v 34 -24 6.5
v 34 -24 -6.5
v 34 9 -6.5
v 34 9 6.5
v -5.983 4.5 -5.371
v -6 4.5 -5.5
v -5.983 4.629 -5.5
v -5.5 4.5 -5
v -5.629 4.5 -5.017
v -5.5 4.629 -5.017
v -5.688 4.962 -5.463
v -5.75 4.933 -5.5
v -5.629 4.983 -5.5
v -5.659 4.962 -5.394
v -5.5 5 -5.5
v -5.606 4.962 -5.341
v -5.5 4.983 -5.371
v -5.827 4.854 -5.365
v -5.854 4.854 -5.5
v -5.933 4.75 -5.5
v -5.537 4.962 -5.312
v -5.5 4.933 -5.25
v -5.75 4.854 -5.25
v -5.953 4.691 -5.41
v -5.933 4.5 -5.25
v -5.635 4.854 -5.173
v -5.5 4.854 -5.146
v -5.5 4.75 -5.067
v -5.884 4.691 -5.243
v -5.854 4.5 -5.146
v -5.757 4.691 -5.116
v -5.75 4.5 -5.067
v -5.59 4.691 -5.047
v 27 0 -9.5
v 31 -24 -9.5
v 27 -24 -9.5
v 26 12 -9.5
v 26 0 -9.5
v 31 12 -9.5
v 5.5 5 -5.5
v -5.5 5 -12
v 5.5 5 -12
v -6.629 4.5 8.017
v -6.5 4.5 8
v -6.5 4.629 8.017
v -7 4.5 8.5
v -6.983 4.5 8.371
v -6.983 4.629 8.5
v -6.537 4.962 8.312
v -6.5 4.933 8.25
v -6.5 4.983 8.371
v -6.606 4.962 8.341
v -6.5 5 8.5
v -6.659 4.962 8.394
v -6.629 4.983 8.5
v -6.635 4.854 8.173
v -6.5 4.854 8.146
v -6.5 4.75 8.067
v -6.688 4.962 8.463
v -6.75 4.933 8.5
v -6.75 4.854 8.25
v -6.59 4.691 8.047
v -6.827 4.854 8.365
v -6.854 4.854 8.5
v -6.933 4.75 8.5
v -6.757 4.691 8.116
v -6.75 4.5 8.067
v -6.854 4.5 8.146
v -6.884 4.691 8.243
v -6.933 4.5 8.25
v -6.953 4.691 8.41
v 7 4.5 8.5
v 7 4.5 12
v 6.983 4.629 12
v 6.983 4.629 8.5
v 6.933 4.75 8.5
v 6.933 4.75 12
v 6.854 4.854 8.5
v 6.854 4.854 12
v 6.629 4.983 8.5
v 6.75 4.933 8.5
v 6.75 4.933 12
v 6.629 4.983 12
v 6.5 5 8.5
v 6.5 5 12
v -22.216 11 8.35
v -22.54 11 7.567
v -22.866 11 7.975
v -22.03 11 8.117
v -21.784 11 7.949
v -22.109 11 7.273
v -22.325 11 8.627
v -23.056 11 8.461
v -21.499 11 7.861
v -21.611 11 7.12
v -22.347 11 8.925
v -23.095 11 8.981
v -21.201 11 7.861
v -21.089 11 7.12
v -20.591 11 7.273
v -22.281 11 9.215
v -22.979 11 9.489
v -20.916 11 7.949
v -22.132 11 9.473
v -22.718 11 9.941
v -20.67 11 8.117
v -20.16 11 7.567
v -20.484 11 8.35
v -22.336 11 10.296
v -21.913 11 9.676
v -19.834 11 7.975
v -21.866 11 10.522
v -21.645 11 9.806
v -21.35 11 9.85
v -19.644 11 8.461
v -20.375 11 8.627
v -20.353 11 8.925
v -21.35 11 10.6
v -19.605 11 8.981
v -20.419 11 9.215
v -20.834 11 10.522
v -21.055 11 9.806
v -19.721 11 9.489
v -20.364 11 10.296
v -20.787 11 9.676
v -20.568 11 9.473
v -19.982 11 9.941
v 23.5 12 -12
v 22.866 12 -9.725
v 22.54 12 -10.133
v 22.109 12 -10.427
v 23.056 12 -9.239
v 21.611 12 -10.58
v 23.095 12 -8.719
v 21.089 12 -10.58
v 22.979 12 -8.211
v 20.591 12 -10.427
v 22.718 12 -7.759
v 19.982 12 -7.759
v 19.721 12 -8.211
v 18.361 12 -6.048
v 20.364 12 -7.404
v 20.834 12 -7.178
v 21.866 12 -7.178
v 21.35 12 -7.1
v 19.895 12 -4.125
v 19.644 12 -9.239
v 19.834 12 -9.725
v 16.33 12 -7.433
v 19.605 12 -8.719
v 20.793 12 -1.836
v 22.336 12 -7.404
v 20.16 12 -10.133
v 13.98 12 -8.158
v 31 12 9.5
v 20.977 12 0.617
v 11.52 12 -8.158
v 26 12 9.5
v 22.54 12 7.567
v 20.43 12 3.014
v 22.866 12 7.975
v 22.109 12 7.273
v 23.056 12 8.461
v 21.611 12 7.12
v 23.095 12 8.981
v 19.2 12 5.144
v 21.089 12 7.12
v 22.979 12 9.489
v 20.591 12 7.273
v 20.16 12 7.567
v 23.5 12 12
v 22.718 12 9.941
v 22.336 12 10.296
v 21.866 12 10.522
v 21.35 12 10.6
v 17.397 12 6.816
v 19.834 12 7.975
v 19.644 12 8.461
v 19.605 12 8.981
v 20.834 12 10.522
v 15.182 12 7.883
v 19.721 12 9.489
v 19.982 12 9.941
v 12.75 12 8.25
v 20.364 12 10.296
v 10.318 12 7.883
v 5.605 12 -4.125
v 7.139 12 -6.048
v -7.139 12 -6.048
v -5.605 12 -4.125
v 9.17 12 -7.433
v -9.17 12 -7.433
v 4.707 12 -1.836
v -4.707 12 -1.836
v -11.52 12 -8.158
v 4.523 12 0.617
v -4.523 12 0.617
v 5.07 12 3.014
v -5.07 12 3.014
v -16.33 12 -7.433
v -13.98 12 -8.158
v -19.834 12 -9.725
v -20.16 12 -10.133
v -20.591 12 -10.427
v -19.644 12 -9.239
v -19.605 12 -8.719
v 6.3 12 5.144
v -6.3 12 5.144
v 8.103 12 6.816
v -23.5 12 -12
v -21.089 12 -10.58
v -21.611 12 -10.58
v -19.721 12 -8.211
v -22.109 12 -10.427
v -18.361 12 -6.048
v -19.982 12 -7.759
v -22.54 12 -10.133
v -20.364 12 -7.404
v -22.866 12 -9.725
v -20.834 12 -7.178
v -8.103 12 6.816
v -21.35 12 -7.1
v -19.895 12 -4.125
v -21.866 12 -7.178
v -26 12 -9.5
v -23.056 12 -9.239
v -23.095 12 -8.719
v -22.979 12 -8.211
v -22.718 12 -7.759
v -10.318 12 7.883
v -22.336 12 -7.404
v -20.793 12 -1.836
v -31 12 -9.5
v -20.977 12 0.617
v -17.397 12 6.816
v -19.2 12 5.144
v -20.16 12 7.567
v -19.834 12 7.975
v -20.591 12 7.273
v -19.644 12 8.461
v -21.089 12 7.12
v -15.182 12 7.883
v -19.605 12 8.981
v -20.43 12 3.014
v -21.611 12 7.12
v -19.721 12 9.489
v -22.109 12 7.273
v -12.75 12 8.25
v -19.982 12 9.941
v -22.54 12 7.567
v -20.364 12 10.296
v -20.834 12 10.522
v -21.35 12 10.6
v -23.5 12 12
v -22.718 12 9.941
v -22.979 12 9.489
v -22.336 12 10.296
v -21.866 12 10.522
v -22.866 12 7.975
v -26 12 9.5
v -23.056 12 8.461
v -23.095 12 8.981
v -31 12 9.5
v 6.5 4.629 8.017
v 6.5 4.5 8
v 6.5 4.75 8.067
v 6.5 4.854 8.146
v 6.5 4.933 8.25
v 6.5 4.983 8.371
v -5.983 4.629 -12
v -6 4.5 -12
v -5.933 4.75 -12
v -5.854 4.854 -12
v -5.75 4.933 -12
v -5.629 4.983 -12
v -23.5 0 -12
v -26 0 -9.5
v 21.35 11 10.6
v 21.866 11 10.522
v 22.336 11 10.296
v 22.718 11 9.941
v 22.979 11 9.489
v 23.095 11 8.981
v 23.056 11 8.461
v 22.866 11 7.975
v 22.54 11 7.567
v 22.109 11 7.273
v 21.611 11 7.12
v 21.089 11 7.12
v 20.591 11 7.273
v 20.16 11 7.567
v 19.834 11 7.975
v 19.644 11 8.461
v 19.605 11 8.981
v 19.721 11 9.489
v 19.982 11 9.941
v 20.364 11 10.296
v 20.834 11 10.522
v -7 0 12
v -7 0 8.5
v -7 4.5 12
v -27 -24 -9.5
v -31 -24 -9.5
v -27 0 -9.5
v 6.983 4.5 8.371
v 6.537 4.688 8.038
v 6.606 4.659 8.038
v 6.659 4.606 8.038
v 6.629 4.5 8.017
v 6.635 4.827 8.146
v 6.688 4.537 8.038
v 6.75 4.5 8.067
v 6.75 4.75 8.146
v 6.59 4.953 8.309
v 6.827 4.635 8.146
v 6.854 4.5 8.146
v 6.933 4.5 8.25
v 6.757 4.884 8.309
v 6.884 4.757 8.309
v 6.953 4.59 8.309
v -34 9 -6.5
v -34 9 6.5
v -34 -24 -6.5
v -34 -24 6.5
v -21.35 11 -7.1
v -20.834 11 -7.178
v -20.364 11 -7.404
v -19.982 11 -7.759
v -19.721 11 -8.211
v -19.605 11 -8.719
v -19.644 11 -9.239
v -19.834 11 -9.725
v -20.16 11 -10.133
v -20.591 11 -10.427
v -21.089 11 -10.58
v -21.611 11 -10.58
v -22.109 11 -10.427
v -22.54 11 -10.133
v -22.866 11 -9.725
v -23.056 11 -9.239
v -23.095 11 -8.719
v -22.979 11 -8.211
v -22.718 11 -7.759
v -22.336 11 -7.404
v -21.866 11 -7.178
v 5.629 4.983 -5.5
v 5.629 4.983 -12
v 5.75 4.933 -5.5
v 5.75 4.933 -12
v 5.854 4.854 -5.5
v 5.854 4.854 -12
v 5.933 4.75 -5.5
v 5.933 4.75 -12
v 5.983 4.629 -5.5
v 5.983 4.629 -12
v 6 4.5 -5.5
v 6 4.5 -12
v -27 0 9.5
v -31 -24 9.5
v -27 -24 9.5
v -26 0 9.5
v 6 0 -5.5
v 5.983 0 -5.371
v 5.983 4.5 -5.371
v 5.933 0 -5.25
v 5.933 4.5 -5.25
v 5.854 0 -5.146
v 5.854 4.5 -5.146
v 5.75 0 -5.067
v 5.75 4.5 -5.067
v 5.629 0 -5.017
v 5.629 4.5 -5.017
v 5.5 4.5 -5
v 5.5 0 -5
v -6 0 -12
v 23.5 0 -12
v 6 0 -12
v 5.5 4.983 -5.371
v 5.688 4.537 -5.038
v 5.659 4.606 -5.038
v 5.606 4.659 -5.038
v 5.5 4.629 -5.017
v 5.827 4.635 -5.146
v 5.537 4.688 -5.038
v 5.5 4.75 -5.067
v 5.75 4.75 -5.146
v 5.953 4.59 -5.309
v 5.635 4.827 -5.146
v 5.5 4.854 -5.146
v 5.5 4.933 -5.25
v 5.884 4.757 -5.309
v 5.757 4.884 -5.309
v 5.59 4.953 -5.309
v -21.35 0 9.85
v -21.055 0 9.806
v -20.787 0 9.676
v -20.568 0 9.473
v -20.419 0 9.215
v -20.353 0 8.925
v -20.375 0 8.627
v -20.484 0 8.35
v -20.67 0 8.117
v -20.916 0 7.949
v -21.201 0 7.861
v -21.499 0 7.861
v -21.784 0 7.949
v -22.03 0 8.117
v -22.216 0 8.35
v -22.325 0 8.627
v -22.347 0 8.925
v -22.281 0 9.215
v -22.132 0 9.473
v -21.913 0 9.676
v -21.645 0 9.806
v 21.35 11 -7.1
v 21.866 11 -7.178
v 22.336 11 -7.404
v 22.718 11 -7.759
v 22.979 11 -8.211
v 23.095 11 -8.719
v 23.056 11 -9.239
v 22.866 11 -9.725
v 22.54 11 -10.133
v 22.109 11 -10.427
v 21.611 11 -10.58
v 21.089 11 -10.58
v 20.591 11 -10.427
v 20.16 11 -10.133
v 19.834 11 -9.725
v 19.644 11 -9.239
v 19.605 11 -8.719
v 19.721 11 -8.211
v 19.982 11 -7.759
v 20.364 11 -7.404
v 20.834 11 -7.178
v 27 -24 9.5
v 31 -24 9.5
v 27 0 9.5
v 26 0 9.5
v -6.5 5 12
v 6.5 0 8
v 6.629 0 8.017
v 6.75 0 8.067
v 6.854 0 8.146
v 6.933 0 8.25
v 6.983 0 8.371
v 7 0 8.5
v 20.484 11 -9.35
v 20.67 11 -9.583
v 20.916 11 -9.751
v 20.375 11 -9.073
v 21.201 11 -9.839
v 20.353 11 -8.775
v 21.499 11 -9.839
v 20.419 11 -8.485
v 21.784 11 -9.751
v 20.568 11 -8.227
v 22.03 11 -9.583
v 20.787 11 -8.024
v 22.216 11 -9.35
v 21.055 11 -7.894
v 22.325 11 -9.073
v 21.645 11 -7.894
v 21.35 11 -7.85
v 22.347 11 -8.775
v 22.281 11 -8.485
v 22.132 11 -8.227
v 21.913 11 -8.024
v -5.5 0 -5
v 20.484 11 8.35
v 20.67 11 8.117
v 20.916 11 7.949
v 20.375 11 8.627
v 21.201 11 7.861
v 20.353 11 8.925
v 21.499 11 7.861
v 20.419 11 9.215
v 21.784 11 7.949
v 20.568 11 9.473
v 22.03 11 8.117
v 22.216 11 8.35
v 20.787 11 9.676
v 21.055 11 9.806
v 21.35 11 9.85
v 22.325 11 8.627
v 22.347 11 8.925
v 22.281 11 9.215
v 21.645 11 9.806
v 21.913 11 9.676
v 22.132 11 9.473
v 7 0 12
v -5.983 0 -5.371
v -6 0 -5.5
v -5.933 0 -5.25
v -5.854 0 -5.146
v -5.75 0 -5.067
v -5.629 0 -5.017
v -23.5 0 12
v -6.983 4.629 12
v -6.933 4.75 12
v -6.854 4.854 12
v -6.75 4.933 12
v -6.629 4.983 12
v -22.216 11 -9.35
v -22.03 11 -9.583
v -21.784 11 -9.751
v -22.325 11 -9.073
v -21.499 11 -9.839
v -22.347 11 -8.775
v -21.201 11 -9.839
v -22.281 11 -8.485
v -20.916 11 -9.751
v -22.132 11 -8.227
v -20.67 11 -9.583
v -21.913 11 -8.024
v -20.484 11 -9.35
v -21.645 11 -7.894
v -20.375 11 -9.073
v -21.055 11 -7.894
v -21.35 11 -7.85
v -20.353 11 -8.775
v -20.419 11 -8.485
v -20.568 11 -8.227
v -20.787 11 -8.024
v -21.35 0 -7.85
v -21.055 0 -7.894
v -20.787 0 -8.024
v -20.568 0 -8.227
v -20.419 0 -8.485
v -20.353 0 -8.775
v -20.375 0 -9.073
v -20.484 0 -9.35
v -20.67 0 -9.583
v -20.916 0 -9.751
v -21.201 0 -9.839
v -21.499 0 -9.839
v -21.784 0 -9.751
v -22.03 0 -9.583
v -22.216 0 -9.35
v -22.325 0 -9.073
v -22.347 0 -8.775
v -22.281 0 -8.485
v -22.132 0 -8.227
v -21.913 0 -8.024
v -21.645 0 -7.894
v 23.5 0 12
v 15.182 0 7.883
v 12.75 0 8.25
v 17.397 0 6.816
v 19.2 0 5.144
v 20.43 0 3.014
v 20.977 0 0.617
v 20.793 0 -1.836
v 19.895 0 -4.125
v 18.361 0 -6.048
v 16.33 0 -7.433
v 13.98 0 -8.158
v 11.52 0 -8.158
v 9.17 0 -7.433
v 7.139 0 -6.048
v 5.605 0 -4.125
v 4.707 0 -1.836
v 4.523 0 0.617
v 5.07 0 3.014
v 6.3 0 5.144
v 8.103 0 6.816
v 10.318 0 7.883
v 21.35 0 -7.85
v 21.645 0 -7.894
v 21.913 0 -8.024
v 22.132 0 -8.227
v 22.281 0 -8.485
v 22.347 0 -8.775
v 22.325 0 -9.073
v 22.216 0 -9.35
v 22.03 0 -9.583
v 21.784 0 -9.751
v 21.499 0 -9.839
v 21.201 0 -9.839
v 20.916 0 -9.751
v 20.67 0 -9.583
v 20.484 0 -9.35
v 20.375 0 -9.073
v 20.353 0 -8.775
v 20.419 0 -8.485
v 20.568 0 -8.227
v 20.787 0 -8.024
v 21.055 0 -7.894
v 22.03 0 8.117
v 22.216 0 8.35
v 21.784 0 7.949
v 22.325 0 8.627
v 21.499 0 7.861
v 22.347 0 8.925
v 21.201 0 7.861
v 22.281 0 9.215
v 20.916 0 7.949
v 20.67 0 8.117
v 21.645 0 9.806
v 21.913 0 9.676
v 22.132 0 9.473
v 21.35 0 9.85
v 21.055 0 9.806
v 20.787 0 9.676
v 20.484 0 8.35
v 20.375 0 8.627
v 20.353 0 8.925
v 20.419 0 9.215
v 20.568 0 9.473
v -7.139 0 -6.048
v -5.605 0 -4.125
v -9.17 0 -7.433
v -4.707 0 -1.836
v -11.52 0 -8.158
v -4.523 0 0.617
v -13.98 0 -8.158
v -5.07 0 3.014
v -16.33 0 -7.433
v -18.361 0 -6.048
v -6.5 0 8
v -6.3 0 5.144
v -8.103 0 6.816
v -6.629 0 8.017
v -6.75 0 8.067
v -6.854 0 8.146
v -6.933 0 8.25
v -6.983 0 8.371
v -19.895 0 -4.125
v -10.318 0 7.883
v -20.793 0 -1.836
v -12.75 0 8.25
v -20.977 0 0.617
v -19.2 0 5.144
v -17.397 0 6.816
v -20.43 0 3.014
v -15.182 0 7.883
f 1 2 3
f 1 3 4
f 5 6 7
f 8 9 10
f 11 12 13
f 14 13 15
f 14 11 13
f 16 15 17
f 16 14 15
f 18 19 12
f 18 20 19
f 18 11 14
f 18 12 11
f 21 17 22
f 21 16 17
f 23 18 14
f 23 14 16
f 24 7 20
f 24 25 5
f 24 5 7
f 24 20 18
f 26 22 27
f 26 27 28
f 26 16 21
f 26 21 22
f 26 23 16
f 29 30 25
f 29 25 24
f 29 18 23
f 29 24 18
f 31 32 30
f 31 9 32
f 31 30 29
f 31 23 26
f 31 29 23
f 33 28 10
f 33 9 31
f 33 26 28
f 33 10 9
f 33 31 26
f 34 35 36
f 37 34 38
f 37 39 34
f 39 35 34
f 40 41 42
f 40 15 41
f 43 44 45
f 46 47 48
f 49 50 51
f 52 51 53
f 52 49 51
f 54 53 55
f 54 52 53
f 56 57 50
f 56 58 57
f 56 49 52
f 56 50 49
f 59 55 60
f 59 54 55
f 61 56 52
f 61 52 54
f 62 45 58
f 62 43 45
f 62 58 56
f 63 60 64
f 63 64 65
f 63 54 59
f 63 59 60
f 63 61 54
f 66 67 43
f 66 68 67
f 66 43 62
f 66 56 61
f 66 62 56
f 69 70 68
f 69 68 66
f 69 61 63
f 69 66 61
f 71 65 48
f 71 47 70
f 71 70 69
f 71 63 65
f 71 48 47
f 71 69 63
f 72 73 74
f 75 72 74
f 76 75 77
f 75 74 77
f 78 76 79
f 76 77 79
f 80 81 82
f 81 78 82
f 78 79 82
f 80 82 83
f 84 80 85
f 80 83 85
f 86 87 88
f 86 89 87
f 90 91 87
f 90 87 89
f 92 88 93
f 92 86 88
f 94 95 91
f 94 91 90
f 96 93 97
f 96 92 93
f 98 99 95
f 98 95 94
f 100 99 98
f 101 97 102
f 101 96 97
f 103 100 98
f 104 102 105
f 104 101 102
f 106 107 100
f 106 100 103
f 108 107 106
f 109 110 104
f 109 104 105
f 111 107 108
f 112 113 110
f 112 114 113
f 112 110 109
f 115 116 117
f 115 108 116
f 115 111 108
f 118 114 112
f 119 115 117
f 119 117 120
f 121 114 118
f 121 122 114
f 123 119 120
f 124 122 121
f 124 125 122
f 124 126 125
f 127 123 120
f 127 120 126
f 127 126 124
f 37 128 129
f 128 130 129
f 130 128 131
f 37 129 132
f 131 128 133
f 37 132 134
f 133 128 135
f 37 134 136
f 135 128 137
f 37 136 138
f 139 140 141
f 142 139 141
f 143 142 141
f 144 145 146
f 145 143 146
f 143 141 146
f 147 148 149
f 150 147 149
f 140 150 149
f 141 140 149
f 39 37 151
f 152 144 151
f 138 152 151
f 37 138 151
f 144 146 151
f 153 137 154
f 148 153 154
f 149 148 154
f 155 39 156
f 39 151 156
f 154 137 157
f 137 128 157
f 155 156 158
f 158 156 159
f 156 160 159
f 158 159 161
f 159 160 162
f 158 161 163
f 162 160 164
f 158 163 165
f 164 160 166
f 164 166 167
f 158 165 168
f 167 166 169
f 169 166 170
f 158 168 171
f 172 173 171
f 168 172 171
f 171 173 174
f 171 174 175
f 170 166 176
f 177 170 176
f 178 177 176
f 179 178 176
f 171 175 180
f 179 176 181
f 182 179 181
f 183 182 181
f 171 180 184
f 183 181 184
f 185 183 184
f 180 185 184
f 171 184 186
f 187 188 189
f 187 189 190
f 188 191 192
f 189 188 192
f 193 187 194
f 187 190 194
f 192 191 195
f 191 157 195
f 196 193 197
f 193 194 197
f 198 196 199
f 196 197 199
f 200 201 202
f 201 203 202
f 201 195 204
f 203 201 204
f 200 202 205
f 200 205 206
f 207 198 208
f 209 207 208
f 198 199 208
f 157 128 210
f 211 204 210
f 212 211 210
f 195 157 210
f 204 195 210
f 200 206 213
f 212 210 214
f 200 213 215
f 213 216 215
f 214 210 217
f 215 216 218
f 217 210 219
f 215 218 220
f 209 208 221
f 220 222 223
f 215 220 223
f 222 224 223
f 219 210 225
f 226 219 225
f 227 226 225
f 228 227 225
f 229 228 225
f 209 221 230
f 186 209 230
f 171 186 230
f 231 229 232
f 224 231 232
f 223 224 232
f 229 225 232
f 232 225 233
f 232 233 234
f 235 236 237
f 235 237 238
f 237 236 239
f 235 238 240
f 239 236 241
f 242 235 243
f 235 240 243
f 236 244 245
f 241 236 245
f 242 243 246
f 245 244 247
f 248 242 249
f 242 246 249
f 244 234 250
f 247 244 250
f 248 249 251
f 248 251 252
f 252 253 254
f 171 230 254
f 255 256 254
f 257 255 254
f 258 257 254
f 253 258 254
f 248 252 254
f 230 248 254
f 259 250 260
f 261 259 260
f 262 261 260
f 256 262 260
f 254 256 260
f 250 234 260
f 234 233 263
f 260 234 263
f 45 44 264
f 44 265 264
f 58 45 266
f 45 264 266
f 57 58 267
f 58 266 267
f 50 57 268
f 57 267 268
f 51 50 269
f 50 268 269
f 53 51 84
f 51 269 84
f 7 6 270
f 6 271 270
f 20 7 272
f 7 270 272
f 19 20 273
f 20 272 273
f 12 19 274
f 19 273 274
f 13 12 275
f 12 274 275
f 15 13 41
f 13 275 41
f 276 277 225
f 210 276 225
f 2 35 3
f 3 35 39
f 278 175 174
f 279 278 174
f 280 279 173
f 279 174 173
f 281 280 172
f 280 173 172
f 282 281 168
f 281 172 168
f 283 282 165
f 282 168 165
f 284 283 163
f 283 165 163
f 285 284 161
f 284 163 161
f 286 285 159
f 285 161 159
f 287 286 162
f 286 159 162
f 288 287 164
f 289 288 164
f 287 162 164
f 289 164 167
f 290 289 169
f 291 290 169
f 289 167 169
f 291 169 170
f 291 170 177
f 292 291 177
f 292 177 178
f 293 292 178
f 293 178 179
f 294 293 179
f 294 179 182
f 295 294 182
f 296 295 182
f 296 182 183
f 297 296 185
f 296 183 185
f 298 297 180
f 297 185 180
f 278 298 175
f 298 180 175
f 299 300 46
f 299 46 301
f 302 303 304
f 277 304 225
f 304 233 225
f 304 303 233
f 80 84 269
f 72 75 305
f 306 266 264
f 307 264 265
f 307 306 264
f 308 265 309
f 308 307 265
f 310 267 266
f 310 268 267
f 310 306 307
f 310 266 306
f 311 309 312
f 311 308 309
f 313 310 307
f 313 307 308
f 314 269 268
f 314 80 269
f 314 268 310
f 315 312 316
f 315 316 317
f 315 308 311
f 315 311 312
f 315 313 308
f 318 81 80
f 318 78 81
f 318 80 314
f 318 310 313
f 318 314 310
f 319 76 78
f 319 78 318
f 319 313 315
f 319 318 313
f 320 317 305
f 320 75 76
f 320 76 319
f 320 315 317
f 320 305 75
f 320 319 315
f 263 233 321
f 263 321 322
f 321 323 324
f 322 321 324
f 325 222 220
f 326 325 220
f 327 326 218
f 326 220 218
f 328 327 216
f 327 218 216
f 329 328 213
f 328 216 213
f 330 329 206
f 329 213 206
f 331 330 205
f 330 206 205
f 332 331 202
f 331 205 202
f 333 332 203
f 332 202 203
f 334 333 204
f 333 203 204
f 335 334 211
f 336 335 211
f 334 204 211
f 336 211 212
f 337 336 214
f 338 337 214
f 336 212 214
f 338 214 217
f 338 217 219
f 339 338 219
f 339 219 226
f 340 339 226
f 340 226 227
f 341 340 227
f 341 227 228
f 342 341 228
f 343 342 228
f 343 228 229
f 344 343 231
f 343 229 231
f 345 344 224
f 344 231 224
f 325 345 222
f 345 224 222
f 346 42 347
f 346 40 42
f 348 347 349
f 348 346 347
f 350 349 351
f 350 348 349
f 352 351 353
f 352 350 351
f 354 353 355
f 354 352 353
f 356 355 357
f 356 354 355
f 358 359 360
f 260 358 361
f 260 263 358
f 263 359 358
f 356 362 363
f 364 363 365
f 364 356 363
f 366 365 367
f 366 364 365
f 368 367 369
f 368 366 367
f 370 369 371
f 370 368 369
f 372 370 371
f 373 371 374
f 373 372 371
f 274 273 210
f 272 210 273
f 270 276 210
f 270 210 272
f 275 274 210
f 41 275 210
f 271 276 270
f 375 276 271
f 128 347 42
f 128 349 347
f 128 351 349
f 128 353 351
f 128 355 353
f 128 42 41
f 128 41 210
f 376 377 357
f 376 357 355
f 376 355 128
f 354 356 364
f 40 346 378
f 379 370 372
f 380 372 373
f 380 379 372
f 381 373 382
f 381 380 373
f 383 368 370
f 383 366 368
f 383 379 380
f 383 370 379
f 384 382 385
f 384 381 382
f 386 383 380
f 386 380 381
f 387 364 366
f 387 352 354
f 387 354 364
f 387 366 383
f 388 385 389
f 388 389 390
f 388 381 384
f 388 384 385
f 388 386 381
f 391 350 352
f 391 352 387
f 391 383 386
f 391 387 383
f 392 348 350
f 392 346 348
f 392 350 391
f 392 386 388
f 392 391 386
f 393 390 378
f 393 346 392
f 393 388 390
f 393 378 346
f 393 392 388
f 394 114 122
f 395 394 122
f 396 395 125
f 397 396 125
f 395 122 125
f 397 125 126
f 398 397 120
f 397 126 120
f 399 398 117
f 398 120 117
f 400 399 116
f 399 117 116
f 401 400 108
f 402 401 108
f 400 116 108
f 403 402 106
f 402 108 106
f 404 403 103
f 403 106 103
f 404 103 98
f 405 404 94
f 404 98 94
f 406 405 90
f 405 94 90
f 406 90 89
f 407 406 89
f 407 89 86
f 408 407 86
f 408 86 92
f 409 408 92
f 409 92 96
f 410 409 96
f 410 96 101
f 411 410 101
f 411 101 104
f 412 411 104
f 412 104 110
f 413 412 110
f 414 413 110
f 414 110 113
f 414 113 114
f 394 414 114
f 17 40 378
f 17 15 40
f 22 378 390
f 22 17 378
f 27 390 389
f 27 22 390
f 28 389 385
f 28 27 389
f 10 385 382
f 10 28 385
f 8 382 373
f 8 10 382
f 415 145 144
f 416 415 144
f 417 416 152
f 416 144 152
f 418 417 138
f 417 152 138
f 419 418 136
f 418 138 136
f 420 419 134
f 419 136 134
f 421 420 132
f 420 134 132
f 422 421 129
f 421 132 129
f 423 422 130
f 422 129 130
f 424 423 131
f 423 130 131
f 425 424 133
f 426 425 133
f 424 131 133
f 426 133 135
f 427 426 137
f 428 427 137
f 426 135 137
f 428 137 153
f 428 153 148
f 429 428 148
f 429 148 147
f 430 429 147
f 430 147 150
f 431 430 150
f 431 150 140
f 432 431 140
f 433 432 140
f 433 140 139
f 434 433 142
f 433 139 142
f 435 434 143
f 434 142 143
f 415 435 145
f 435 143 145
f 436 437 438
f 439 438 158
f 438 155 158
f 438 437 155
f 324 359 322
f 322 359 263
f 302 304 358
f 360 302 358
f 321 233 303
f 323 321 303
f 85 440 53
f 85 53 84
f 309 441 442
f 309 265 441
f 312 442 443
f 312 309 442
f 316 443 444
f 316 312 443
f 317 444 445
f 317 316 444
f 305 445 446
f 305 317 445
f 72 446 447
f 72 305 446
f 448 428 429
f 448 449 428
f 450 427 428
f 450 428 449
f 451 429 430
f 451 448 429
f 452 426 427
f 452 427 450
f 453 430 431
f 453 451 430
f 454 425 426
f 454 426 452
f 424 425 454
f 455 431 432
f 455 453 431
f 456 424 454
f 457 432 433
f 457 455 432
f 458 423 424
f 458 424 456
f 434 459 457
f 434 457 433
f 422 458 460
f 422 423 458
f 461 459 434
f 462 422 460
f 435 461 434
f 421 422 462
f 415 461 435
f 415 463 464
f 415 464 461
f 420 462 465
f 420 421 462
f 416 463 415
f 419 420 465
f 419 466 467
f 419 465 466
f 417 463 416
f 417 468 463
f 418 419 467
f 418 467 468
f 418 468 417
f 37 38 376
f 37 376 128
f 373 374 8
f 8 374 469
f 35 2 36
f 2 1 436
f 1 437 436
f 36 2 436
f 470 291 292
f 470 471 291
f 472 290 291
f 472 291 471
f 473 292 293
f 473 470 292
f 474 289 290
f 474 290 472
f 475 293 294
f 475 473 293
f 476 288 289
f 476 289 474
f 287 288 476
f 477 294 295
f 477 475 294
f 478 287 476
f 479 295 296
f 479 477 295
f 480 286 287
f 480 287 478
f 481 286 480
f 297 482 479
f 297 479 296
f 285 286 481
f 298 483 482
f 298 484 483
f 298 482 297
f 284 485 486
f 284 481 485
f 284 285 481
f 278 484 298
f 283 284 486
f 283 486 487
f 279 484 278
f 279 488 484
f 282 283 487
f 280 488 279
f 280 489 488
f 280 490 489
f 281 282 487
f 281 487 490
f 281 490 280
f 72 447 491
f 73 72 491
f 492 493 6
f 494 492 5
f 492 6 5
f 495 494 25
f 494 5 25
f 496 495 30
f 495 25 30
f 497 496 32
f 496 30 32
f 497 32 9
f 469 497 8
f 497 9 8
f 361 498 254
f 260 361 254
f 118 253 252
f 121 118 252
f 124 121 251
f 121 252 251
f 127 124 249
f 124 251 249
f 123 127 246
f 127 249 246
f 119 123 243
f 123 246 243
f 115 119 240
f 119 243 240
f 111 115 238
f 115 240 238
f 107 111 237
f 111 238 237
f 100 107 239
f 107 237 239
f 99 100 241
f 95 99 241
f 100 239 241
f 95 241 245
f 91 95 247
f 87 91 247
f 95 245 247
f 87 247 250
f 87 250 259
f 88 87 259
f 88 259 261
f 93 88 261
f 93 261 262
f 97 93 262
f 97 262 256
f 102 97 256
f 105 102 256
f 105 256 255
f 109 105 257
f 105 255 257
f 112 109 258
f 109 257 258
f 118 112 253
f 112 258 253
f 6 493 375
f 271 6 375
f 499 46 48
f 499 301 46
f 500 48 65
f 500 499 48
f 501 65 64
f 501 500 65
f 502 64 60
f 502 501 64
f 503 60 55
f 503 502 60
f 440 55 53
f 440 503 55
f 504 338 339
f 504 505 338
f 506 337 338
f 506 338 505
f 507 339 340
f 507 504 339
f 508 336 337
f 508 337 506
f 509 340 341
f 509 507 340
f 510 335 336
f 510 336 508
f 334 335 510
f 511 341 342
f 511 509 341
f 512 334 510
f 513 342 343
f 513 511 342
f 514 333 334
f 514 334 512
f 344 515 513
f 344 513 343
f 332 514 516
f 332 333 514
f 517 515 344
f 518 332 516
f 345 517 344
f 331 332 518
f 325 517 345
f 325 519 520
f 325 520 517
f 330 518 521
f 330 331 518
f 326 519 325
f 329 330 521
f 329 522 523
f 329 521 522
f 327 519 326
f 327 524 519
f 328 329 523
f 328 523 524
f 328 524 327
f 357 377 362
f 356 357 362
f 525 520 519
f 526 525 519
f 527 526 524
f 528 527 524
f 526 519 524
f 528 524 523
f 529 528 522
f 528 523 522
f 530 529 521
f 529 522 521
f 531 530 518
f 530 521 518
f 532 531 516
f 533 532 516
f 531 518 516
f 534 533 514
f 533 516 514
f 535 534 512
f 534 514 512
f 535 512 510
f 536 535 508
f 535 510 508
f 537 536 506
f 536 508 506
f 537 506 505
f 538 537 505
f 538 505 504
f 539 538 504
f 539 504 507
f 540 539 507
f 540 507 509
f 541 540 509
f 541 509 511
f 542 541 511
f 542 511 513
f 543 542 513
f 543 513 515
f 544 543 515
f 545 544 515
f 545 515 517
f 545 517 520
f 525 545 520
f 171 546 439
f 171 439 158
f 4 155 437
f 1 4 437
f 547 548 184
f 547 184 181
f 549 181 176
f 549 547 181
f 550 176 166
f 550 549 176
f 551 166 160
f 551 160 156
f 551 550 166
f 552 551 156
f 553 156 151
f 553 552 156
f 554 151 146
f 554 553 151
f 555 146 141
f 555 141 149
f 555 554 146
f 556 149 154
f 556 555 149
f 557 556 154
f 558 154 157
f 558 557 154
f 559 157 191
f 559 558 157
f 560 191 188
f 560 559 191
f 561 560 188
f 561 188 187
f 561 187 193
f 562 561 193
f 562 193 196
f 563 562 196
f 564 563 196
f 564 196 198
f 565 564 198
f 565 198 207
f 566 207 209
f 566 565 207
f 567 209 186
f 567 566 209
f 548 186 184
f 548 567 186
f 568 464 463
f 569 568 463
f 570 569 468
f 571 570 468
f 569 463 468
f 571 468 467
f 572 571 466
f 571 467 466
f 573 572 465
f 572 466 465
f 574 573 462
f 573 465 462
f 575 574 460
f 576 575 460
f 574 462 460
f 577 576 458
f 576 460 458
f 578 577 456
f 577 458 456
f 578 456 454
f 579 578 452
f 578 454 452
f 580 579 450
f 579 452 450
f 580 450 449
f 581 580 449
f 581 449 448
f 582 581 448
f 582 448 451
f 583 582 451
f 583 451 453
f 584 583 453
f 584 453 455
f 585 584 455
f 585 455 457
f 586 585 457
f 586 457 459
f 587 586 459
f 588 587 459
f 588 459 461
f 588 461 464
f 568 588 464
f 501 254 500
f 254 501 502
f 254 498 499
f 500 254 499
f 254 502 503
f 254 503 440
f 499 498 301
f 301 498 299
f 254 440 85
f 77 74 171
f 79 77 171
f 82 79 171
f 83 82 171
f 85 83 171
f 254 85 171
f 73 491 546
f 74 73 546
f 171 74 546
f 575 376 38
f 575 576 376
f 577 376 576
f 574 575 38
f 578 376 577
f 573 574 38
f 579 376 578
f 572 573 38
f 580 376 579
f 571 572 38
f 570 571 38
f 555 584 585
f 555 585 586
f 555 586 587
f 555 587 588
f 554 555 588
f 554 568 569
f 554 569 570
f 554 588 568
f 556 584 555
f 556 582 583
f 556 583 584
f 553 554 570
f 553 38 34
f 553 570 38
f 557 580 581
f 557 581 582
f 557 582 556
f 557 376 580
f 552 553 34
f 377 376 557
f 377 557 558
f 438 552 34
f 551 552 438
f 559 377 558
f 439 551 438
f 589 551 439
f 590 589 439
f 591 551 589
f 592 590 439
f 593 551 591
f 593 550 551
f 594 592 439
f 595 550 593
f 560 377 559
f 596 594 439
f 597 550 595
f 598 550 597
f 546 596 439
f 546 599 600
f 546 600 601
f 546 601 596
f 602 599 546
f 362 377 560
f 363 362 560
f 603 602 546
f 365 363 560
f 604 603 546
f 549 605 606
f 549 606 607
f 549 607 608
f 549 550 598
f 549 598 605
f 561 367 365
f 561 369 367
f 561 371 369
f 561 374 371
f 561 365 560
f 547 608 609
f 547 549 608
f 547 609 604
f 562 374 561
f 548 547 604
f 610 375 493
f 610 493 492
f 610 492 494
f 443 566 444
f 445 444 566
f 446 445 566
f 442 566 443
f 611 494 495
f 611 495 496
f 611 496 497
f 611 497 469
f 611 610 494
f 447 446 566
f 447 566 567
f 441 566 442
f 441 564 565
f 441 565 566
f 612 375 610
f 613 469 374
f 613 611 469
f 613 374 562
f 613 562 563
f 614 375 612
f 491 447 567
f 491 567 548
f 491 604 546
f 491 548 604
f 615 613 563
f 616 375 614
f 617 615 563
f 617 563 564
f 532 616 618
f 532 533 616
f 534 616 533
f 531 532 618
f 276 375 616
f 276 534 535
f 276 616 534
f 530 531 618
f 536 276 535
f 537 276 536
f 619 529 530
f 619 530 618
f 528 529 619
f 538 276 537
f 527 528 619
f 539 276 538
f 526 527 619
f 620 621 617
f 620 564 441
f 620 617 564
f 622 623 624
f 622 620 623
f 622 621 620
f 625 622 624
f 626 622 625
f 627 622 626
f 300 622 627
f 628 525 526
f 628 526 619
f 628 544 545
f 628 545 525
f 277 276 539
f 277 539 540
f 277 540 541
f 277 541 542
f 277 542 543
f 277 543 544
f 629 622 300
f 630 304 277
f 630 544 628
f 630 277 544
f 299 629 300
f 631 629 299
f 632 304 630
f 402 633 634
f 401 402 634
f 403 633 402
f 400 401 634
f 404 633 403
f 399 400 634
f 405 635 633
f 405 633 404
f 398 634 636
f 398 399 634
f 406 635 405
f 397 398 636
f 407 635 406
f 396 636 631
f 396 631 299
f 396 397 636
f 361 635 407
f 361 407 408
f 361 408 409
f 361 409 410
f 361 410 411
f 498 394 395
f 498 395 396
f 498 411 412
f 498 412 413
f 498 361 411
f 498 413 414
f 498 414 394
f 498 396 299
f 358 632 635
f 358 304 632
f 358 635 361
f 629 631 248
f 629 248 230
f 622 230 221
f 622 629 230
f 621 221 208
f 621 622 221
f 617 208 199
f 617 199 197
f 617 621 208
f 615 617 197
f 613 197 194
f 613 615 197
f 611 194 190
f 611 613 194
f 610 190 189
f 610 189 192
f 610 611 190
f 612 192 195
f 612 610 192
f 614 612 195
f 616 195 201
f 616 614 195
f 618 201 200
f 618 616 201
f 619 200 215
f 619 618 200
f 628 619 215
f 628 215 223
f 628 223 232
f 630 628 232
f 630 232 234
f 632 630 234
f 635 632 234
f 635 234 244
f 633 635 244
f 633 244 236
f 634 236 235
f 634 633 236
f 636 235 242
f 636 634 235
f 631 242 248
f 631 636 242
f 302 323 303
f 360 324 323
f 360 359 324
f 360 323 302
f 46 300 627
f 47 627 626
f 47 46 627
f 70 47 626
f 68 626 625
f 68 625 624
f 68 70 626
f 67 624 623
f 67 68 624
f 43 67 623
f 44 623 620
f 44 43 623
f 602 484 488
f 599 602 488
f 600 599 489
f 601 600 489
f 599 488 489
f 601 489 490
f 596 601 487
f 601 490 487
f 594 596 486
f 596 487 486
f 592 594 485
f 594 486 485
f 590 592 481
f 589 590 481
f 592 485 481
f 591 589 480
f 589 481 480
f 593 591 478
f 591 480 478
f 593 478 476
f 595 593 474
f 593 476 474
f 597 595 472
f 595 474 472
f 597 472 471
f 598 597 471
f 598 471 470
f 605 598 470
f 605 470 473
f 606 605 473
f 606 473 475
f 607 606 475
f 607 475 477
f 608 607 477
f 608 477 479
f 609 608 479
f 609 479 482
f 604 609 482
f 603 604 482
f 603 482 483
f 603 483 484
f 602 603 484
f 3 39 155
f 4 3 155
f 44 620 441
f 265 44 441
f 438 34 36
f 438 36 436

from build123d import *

# Parameters (mm, degrees)
SKETCH1_W                = 52
SKETCH1_H                = 24
SKETCH1_R                = 8.25
BOSS_EXTRUDE1_DEPTH      = 12
SKETCH2_R                = 1
CUT_EXTRUDE1_DEPTH       = 32.048349393
SKETCH3_R                = 1.75
CUT_EXTRUDE2_DEPTH       = 1
CUT_EXTRUDE3_DEPTH       = 5
FILLET3_R                = 0.5
CHAMFER1_SIZE            = 2.5
SKETCH5_W                = 19
SKETCH5_H                = 12
BOSS_EXTRUDE2_DEPTH      = 8
SKETCH6_W                = 7
SKETCH6_H                = 19
BOSS_EXTRUDE3_DEPTH      = 24
CHAMFER2_SIZE            = 3
CHAMFER2_OF_MIRROR1_SIZE = 3
SKETCH7_W                = 14
SKETCH7_H                = 8
CUT_EXTRUDE4_DEPTH       = 5
FILLET4_R                = 0.5


with BuildPart() as part:
    # Sketch1 → Boss-Extrude1 (new body)
    with BuildSketch(Plane(origin=(0, 0, 0), x_dir=(1, 0, 0), z_dir=(0, 1, 0))):
        Rectangle(SKETCH1_W, SKETCH1_H)
        with Locations(Location((12.75, 0, 0), (0, 0, 270))):
            Circle(SKETCH1_R, mode=Mode.SUBTRACT)
        with Locations(Location((-12.75, 0, 0), (0, 0, 270))):
            Circle(SKETCH1_R, mode=Mode.SUBTRACT)
    extrude(amount=BOSS_EXTRUDE1_DEPTH)

    # Sketch2 → Cut-Extrude1 (cut, through all)
    with BuildSketch(Plane(origin=(0, 12, 0), x_dir=(1, 0, 0), z_dir=(0, 1, 0))):
        with Locations(Location((-21.35, 8.85, 0), (0, 0, 270))):
            Circle(SKETCH2_R)
        with Locations(Location((21.35, 8.85, 0), (0, 0, 270))):
            Circle(SKETCH2_R)
        with Locations(Location((21.35, -8.85, 0), (0, 0, 270))):
            Circle(SKETCH2_R)
        with Locations(Location((-21.35, -8.85, 0), (0, 0, 270))):
            Circle(SKETCH2_R)
    extrude(amount=-CUT_EXTRUDE1_DEPTH, mode=Mode.SUBTRACT)

    # Sketch3 → Cut-Extrude2 (cut)
    with BuildSketch(Plane(origin=(0, 12, 0), x_dir=(1, 0, 0), z_dir=(0, 1, 0))):
        with Locations(Location((-21.35, 8.85, 0), (0, 0, 270))):
            Circle(SKETCH3_R)
        with Locations(Location((21.35, 8.85, 0), (0, 0, 270))):
            Circle(SKETCH3_R)
        with Locations(Location((21.35, -8.85, 0), (0, 0, 270))):
            Circle(SKETCH3_R)
        with Locations(Location((-21.35, -8.85, 0), (0, 0, 270))):
            Circle(SKETCH3_R)
    extrude(amount=-CUT_EXTRUDE2_DEPTH, mode=Mode.SUBTRACT)

    # Sketch4 → Cut-Extrude3 (cut)
    with BuildSketch(Plane.XZ):
        Polygon((-6, -5), (-6, -12), (6, -12), (6, -5), (0, -5), align=None)
    extrude(amount=-CUT_EXTRUDE3_DEPTH, mode=Mode.SUBTRACT)

    # Fillet3
    fillet3_edges = [part.edges().sort_by_distance(p)[0] for p in [
        (-6, 2.5, -5),
        (6, 5, -8.5),
        (6, 2.5, -5),
        (-6, 5, -8.5),
        (0, 5, -5),
    ]]
    fillet(fillet3_edges, radius=FILLET3_R)

    # Chamfer1
    chamfer1_edges = [part.edges().sort_by_distance(p)[0] for p in [
        (26, 6, 12),
        (-26, 6, 12),
        (-26, 6, -12),
        (26, 6, -12),
    ]]
    chamfer(chamfer1_edges, length=CHAMFER1_SIZE)

    # Sketch5 → Boss-Extrude2 (add)
    with BuildSketch(Plane.ZY.offset(26)):
        with Locations((0, 6)):
            Rectangle(SKETCH5_W, SKETCH5_H)
    boss_extrude2 = extrude(amount=BOSS_EXTRUDE2_DEPTH)

    # Sketch6 → Boss-Extrude3 (add)
    with BuildSketch(Plane.XZ):
        with Locations((-30.5, 0)):
            Rectangle(SKETCH6_W, SKETCH6_H)
    boss_extrude3 = extrude(amount=BOSS_EXTRUDE3_DEPTH)

    # Chamfer2
    chamfer2_edges = [part.edges().sort_by_distance(p)[0] for p in [
        (-34, -6, 9.5),
        (-34, 12, 0),
        (-34, -6, -9.5),
    ]]
    chamfer(chamfer2_edges, length=CHAMFER2_SIZE)

    # Mirror1: Boss-Extrude2, Boss-Extrude3 across plane
    add(boss_extrude2.mirror(Plane(origin=(0, 0, 0), x_dir=(0, 0, 1), z_dir=(1, 0, 0))))
    add(boss_extrude3.mirror(Plane(origin=(0, 0, 0), x_dir=(0, 0, 1), z_dir=(1, 0, 0))))

    # Chamfer2 of Mirror1
    chamfer2_of_mirror1_edges = [part.edges().sort_by_distance(p)[0] for p in [
        (34, -6, 9.5),
        (34, 12, 0),
        (34, -6, -9.5),
    ]]
    chamfer(chamfer2_of_mirror1_edges, length=CHAMFER2_OF_MIRROR1_SIZE)

    # Sketch7 → Cut-Extrude4 (cut)
    with BuildSketch(Plane.XZ):
        with Locations((0, 12)):
            Rectangle(SKETCH7_W, SKETCH7_H)
    extrude(amount=-CUT_EXTRUDE4_DEPTH, mode=Mode.SUBTRACT)

    # Fillet4
    fillet4_edges = [part.edges().sort_by_distance(p)[0] for p in [
        (-7, 2.5, 8),
        (7, 5, 10),
        (0, 5, 8),
        (-7, 5, 10),
        (7, 2.5, 8),
    ]]
    fillet(fillet4_edges, radius=FILLET4_R)


solid = part.part
